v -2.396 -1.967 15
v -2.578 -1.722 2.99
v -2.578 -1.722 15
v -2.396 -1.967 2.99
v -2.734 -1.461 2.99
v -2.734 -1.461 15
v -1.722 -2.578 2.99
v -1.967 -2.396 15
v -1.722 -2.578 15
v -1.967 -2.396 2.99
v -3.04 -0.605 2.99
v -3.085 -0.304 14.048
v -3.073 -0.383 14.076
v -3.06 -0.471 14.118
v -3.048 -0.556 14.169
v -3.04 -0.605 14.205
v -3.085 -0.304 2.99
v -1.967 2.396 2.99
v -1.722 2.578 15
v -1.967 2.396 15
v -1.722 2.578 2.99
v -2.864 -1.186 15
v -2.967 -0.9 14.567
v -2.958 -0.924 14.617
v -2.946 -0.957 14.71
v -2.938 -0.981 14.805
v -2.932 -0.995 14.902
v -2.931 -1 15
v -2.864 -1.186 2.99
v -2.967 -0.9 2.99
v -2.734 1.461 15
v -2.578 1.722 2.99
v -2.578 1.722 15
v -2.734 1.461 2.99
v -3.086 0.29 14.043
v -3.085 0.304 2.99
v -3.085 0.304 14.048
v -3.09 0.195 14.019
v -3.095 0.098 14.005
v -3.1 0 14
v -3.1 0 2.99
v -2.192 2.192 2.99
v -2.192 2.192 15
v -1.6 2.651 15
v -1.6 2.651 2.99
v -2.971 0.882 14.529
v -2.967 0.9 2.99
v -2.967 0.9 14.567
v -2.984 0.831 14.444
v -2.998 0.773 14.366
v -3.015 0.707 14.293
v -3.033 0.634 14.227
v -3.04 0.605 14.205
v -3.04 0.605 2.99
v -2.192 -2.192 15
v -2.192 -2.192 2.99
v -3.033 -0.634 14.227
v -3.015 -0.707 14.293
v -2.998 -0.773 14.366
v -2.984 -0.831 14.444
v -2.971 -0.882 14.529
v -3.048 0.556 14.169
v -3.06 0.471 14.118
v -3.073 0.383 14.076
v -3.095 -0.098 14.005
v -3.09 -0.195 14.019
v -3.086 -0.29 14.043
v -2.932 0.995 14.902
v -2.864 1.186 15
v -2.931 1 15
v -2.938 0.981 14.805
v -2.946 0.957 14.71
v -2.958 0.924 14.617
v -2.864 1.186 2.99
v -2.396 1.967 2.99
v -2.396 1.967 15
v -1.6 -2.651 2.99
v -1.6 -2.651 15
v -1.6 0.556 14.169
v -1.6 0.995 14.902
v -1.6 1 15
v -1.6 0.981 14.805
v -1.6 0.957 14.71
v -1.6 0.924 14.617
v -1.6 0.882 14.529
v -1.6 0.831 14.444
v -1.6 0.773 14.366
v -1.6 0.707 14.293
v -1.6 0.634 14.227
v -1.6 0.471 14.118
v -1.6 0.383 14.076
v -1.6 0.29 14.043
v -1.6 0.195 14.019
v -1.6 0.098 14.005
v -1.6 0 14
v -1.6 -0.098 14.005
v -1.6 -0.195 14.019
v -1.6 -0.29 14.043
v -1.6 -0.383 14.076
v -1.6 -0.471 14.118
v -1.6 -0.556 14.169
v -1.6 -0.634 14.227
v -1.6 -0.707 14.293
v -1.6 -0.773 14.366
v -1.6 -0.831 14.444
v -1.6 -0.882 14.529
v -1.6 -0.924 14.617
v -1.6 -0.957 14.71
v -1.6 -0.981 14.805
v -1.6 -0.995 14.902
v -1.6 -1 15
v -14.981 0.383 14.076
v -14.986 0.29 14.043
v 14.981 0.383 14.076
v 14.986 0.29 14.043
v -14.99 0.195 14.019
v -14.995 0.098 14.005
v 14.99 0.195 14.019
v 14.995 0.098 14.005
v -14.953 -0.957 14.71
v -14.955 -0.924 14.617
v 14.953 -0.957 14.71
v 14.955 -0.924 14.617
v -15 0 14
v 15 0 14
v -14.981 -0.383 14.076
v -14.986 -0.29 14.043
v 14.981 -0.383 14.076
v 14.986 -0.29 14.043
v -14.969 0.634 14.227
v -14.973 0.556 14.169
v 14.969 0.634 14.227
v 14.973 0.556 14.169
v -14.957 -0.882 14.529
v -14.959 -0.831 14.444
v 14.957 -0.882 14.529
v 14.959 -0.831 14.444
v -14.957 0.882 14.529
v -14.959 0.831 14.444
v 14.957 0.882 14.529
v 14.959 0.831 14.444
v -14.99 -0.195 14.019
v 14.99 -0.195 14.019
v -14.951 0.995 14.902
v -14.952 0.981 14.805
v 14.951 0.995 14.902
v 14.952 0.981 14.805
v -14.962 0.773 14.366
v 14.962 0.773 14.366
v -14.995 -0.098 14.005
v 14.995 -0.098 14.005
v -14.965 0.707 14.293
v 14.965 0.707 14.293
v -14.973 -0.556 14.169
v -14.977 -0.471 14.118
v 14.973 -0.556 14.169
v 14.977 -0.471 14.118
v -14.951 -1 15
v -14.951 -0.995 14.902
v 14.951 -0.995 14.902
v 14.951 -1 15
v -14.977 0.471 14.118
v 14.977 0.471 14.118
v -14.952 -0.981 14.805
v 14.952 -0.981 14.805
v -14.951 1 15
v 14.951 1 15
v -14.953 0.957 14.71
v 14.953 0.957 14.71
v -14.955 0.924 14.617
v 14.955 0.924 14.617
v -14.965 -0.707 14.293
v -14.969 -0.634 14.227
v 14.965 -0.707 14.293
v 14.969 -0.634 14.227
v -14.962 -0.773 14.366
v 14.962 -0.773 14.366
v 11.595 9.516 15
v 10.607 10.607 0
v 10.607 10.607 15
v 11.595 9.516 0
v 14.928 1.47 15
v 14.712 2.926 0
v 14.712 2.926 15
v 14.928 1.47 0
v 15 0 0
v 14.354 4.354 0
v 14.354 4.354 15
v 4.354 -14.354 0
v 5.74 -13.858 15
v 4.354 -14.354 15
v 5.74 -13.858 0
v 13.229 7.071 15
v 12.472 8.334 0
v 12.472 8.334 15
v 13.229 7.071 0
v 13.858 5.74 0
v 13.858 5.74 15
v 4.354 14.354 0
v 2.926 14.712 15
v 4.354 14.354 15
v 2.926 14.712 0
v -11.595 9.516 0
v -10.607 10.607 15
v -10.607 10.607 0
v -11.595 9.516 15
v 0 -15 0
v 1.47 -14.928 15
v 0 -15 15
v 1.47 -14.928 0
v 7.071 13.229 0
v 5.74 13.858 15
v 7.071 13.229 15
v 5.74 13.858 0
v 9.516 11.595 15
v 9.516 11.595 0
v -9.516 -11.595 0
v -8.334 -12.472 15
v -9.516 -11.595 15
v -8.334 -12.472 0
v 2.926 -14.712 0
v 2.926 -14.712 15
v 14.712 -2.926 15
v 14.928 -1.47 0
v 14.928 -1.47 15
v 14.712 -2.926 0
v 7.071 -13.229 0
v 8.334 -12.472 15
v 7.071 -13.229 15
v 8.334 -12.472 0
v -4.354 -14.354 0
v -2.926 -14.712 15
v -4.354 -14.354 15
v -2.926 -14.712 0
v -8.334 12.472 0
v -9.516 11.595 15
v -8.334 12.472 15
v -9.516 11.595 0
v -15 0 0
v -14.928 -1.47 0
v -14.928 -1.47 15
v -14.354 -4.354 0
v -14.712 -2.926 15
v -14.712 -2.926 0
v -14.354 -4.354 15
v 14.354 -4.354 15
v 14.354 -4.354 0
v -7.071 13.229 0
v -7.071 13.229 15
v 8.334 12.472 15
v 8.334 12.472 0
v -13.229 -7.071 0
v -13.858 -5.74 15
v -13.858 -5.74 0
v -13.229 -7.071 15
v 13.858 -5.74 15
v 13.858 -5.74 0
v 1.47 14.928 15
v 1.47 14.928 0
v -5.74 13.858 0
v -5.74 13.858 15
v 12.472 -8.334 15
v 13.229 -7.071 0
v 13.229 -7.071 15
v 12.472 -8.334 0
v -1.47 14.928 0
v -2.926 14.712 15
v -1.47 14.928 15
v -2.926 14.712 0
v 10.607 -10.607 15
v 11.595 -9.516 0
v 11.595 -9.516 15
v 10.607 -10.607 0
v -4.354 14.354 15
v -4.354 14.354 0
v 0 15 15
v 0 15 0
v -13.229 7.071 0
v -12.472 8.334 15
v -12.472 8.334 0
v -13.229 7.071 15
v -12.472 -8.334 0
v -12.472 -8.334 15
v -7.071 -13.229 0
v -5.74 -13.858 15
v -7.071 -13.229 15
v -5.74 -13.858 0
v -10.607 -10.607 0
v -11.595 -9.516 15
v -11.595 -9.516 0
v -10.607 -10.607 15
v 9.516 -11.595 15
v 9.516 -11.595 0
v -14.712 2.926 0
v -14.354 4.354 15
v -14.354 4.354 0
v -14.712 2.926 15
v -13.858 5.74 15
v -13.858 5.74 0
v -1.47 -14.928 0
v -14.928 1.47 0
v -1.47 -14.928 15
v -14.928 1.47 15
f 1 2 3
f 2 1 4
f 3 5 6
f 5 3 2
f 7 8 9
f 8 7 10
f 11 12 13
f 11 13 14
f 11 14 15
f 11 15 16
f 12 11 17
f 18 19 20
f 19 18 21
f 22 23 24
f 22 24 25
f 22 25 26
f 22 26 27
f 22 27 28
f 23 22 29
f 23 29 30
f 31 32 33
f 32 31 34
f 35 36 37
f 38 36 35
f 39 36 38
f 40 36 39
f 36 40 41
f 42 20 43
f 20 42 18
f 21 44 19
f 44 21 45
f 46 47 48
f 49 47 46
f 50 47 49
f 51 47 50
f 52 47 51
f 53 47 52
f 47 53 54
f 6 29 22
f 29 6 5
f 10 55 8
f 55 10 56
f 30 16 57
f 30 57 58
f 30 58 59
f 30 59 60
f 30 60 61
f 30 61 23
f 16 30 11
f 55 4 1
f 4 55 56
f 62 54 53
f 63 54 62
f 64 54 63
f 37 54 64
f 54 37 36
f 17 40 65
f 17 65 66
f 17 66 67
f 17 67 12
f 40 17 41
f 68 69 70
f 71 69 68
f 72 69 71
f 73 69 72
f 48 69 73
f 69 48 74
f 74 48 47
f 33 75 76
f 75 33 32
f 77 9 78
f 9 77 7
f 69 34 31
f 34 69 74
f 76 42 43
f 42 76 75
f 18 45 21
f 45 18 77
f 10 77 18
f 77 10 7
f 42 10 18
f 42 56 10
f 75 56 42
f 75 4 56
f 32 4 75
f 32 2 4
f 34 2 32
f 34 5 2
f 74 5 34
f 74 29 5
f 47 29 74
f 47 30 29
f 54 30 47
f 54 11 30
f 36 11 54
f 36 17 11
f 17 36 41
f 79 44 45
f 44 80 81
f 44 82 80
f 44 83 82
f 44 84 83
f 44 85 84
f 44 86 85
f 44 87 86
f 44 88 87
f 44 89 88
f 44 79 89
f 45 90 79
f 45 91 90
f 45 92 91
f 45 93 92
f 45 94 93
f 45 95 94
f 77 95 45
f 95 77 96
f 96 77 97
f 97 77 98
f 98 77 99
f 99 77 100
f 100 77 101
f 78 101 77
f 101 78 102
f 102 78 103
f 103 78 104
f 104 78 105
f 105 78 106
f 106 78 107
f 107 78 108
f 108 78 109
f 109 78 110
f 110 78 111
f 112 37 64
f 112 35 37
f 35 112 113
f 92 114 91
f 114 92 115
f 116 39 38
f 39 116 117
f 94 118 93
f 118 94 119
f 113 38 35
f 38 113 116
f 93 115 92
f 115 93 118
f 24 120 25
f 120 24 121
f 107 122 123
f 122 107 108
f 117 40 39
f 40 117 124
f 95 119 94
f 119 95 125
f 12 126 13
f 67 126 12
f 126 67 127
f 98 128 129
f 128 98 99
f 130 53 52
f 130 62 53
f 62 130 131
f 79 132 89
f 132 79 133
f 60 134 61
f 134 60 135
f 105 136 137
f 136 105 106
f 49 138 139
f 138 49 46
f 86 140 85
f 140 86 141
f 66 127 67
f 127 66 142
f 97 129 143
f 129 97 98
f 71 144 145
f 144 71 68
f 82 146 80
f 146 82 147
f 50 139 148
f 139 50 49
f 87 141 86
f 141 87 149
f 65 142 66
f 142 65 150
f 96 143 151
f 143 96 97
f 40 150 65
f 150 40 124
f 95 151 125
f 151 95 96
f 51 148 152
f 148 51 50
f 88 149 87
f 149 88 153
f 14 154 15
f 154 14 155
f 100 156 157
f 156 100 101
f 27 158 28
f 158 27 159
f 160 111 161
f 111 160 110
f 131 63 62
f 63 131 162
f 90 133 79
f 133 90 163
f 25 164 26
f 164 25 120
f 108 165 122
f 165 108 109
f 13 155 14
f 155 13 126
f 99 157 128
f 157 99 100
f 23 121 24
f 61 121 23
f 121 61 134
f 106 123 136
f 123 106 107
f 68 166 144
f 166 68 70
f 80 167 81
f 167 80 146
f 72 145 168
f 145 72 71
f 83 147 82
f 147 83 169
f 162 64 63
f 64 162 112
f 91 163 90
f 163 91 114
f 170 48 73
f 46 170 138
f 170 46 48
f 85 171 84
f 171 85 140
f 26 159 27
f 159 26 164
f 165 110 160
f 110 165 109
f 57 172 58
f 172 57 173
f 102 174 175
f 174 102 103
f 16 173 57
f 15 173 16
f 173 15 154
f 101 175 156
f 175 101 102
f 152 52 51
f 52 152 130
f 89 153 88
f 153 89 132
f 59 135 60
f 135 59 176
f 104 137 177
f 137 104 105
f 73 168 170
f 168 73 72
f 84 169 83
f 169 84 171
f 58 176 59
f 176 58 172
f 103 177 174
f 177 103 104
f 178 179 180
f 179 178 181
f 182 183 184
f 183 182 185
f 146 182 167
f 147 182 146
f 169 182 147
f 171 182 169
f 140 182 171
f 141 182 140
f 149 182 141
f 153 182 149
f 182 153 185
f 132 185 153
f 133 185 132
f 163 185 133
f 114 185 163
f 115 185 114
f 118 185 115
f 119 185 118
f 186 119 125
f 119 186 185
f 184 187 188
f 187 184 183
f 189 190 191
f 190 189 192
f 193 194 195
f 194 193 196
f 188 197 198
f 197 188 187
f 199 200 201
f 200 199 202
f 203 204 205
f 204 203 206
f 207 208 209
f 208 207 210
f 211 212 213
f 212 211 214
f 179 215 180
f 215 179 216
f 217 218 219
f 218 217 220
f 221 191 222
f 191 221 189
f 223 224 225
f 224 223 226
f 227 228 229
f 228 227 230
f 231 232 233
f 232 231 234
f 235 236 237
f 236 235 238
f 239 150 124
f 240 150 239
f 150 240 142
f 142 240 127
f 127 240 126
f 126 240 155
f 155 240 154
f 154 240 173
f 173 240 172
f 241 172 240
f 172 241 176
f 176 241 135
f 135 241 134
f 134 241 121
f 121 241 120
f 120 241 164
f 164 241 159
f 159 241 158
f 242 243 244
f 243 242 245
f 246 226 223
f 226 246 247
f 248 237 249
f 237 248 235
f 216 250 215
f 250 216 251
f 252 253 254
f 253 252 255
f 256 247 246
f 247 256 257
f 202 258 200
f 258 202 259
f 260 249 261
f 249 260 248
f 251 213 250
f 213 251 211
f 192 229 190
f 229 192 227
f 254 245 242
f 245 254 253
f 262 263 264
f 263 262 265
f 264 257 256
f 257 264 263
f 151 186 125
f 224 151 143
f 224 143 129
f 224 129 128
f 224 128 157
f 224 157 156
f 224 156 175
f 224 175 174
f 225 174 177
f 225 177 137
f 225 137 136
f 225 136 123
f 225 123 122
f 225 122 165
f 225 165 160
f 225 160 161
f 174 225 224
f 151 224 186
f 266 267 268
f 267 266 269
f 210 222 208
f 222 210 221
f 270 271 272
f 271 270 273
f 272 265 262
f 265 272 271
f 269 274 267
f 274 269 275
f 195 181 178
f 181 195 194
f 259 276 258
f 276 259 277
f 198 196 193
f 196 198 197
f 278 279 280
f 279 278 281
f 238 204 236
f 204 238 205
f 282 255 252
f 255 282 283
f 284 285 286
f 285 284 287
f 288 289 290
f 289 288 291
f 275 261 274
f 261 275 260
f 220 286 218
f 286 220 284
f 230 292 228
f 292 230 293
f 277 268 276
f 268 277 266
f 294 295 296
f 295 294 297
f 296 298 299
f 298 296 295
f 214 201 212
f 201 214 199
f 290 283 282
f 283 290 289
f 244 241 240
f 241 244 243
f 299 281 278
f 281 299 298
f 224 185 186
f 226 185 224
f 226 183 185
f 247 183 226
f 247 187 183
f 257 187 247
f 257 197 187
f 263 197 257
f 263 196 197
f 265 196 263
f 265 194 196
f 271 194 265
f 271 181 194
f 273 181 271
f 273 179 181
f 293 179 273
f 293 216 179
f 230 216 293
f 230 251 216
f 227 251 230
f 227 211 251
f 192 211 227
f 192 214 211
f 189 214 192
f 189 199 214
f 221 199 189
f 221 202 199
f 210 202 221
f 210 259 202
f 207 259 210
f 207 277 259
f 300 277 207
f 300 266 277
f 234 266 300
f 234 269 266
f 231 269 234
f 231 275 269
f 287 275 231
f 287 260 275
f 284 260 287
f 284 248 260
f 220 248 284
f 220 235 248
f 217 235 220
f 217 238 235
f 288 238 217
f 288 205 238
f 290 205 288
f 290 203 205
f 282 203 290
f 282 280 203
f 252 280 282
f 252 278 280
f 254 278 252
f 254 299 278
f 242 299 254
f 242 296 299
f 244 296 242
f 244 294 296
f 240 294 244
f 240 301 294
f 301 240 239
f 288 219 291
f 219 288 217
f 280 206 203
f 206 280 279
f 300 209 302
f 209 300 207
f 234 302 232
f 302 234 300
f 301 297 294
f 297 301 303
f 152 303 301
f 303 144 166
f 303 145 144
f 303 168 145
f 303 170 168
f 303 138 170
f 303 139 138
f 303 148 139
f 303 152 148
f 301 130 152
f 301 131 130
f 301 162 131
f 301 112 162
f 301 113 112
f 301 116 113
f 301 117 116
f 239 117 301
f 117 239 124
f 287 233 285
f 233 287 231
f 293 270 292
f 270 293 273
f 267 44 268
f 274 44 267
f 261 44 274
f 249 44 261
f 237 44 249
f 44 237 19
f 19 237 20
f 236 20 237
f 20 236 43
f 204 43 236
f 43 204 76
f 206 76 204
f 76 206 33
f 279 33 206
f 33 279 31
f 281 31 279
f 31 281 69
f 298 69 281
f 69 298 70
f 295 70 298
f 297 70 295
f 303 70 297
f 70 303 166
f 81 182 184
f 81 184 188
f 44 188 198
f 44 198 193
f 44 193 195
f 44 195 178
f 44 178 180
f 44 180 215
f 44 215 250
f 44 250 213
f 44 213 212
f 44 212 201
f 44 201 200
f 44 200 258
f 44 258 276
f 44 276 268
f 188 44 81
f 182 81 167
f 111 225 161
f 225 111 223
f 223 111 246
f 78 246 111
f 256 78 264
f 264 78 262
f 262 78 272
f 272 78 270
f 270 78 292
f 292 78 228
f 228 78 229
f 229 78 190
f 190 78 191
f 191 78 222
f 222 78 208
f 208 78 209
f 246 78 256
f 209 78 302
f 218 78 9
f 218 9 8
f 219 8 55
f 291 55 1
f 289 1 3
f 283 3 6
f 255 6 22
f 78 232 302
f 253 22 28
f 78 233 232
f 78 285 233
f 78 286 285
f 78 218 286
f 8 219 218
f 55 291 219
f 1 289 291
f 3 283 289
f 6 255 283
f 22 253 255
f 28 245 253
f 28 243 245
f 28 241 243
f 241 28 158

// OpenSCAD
// Built by bench/smallmodels/features/compiler.py from a list of features.
$fn = 64;
difference() {
  union() {
    translate([0, 0, 0]) cylinder(d = 30, h = 15);
  }
  union() {
    translate([0, 0, 2.99]) rotate([0, 0, 0]) difference() { cylinder(d = 6.2, h = 12.02); translate([-1.6, -6.2, -1]) cube([6.2, 12.4, 14.02]); }
    translate([0, 0, 15]) rotate([0, 0, 0]) rotate([0, 90, 0]) cylinder(d = 2, h = 1060, center = true);
  }
}
